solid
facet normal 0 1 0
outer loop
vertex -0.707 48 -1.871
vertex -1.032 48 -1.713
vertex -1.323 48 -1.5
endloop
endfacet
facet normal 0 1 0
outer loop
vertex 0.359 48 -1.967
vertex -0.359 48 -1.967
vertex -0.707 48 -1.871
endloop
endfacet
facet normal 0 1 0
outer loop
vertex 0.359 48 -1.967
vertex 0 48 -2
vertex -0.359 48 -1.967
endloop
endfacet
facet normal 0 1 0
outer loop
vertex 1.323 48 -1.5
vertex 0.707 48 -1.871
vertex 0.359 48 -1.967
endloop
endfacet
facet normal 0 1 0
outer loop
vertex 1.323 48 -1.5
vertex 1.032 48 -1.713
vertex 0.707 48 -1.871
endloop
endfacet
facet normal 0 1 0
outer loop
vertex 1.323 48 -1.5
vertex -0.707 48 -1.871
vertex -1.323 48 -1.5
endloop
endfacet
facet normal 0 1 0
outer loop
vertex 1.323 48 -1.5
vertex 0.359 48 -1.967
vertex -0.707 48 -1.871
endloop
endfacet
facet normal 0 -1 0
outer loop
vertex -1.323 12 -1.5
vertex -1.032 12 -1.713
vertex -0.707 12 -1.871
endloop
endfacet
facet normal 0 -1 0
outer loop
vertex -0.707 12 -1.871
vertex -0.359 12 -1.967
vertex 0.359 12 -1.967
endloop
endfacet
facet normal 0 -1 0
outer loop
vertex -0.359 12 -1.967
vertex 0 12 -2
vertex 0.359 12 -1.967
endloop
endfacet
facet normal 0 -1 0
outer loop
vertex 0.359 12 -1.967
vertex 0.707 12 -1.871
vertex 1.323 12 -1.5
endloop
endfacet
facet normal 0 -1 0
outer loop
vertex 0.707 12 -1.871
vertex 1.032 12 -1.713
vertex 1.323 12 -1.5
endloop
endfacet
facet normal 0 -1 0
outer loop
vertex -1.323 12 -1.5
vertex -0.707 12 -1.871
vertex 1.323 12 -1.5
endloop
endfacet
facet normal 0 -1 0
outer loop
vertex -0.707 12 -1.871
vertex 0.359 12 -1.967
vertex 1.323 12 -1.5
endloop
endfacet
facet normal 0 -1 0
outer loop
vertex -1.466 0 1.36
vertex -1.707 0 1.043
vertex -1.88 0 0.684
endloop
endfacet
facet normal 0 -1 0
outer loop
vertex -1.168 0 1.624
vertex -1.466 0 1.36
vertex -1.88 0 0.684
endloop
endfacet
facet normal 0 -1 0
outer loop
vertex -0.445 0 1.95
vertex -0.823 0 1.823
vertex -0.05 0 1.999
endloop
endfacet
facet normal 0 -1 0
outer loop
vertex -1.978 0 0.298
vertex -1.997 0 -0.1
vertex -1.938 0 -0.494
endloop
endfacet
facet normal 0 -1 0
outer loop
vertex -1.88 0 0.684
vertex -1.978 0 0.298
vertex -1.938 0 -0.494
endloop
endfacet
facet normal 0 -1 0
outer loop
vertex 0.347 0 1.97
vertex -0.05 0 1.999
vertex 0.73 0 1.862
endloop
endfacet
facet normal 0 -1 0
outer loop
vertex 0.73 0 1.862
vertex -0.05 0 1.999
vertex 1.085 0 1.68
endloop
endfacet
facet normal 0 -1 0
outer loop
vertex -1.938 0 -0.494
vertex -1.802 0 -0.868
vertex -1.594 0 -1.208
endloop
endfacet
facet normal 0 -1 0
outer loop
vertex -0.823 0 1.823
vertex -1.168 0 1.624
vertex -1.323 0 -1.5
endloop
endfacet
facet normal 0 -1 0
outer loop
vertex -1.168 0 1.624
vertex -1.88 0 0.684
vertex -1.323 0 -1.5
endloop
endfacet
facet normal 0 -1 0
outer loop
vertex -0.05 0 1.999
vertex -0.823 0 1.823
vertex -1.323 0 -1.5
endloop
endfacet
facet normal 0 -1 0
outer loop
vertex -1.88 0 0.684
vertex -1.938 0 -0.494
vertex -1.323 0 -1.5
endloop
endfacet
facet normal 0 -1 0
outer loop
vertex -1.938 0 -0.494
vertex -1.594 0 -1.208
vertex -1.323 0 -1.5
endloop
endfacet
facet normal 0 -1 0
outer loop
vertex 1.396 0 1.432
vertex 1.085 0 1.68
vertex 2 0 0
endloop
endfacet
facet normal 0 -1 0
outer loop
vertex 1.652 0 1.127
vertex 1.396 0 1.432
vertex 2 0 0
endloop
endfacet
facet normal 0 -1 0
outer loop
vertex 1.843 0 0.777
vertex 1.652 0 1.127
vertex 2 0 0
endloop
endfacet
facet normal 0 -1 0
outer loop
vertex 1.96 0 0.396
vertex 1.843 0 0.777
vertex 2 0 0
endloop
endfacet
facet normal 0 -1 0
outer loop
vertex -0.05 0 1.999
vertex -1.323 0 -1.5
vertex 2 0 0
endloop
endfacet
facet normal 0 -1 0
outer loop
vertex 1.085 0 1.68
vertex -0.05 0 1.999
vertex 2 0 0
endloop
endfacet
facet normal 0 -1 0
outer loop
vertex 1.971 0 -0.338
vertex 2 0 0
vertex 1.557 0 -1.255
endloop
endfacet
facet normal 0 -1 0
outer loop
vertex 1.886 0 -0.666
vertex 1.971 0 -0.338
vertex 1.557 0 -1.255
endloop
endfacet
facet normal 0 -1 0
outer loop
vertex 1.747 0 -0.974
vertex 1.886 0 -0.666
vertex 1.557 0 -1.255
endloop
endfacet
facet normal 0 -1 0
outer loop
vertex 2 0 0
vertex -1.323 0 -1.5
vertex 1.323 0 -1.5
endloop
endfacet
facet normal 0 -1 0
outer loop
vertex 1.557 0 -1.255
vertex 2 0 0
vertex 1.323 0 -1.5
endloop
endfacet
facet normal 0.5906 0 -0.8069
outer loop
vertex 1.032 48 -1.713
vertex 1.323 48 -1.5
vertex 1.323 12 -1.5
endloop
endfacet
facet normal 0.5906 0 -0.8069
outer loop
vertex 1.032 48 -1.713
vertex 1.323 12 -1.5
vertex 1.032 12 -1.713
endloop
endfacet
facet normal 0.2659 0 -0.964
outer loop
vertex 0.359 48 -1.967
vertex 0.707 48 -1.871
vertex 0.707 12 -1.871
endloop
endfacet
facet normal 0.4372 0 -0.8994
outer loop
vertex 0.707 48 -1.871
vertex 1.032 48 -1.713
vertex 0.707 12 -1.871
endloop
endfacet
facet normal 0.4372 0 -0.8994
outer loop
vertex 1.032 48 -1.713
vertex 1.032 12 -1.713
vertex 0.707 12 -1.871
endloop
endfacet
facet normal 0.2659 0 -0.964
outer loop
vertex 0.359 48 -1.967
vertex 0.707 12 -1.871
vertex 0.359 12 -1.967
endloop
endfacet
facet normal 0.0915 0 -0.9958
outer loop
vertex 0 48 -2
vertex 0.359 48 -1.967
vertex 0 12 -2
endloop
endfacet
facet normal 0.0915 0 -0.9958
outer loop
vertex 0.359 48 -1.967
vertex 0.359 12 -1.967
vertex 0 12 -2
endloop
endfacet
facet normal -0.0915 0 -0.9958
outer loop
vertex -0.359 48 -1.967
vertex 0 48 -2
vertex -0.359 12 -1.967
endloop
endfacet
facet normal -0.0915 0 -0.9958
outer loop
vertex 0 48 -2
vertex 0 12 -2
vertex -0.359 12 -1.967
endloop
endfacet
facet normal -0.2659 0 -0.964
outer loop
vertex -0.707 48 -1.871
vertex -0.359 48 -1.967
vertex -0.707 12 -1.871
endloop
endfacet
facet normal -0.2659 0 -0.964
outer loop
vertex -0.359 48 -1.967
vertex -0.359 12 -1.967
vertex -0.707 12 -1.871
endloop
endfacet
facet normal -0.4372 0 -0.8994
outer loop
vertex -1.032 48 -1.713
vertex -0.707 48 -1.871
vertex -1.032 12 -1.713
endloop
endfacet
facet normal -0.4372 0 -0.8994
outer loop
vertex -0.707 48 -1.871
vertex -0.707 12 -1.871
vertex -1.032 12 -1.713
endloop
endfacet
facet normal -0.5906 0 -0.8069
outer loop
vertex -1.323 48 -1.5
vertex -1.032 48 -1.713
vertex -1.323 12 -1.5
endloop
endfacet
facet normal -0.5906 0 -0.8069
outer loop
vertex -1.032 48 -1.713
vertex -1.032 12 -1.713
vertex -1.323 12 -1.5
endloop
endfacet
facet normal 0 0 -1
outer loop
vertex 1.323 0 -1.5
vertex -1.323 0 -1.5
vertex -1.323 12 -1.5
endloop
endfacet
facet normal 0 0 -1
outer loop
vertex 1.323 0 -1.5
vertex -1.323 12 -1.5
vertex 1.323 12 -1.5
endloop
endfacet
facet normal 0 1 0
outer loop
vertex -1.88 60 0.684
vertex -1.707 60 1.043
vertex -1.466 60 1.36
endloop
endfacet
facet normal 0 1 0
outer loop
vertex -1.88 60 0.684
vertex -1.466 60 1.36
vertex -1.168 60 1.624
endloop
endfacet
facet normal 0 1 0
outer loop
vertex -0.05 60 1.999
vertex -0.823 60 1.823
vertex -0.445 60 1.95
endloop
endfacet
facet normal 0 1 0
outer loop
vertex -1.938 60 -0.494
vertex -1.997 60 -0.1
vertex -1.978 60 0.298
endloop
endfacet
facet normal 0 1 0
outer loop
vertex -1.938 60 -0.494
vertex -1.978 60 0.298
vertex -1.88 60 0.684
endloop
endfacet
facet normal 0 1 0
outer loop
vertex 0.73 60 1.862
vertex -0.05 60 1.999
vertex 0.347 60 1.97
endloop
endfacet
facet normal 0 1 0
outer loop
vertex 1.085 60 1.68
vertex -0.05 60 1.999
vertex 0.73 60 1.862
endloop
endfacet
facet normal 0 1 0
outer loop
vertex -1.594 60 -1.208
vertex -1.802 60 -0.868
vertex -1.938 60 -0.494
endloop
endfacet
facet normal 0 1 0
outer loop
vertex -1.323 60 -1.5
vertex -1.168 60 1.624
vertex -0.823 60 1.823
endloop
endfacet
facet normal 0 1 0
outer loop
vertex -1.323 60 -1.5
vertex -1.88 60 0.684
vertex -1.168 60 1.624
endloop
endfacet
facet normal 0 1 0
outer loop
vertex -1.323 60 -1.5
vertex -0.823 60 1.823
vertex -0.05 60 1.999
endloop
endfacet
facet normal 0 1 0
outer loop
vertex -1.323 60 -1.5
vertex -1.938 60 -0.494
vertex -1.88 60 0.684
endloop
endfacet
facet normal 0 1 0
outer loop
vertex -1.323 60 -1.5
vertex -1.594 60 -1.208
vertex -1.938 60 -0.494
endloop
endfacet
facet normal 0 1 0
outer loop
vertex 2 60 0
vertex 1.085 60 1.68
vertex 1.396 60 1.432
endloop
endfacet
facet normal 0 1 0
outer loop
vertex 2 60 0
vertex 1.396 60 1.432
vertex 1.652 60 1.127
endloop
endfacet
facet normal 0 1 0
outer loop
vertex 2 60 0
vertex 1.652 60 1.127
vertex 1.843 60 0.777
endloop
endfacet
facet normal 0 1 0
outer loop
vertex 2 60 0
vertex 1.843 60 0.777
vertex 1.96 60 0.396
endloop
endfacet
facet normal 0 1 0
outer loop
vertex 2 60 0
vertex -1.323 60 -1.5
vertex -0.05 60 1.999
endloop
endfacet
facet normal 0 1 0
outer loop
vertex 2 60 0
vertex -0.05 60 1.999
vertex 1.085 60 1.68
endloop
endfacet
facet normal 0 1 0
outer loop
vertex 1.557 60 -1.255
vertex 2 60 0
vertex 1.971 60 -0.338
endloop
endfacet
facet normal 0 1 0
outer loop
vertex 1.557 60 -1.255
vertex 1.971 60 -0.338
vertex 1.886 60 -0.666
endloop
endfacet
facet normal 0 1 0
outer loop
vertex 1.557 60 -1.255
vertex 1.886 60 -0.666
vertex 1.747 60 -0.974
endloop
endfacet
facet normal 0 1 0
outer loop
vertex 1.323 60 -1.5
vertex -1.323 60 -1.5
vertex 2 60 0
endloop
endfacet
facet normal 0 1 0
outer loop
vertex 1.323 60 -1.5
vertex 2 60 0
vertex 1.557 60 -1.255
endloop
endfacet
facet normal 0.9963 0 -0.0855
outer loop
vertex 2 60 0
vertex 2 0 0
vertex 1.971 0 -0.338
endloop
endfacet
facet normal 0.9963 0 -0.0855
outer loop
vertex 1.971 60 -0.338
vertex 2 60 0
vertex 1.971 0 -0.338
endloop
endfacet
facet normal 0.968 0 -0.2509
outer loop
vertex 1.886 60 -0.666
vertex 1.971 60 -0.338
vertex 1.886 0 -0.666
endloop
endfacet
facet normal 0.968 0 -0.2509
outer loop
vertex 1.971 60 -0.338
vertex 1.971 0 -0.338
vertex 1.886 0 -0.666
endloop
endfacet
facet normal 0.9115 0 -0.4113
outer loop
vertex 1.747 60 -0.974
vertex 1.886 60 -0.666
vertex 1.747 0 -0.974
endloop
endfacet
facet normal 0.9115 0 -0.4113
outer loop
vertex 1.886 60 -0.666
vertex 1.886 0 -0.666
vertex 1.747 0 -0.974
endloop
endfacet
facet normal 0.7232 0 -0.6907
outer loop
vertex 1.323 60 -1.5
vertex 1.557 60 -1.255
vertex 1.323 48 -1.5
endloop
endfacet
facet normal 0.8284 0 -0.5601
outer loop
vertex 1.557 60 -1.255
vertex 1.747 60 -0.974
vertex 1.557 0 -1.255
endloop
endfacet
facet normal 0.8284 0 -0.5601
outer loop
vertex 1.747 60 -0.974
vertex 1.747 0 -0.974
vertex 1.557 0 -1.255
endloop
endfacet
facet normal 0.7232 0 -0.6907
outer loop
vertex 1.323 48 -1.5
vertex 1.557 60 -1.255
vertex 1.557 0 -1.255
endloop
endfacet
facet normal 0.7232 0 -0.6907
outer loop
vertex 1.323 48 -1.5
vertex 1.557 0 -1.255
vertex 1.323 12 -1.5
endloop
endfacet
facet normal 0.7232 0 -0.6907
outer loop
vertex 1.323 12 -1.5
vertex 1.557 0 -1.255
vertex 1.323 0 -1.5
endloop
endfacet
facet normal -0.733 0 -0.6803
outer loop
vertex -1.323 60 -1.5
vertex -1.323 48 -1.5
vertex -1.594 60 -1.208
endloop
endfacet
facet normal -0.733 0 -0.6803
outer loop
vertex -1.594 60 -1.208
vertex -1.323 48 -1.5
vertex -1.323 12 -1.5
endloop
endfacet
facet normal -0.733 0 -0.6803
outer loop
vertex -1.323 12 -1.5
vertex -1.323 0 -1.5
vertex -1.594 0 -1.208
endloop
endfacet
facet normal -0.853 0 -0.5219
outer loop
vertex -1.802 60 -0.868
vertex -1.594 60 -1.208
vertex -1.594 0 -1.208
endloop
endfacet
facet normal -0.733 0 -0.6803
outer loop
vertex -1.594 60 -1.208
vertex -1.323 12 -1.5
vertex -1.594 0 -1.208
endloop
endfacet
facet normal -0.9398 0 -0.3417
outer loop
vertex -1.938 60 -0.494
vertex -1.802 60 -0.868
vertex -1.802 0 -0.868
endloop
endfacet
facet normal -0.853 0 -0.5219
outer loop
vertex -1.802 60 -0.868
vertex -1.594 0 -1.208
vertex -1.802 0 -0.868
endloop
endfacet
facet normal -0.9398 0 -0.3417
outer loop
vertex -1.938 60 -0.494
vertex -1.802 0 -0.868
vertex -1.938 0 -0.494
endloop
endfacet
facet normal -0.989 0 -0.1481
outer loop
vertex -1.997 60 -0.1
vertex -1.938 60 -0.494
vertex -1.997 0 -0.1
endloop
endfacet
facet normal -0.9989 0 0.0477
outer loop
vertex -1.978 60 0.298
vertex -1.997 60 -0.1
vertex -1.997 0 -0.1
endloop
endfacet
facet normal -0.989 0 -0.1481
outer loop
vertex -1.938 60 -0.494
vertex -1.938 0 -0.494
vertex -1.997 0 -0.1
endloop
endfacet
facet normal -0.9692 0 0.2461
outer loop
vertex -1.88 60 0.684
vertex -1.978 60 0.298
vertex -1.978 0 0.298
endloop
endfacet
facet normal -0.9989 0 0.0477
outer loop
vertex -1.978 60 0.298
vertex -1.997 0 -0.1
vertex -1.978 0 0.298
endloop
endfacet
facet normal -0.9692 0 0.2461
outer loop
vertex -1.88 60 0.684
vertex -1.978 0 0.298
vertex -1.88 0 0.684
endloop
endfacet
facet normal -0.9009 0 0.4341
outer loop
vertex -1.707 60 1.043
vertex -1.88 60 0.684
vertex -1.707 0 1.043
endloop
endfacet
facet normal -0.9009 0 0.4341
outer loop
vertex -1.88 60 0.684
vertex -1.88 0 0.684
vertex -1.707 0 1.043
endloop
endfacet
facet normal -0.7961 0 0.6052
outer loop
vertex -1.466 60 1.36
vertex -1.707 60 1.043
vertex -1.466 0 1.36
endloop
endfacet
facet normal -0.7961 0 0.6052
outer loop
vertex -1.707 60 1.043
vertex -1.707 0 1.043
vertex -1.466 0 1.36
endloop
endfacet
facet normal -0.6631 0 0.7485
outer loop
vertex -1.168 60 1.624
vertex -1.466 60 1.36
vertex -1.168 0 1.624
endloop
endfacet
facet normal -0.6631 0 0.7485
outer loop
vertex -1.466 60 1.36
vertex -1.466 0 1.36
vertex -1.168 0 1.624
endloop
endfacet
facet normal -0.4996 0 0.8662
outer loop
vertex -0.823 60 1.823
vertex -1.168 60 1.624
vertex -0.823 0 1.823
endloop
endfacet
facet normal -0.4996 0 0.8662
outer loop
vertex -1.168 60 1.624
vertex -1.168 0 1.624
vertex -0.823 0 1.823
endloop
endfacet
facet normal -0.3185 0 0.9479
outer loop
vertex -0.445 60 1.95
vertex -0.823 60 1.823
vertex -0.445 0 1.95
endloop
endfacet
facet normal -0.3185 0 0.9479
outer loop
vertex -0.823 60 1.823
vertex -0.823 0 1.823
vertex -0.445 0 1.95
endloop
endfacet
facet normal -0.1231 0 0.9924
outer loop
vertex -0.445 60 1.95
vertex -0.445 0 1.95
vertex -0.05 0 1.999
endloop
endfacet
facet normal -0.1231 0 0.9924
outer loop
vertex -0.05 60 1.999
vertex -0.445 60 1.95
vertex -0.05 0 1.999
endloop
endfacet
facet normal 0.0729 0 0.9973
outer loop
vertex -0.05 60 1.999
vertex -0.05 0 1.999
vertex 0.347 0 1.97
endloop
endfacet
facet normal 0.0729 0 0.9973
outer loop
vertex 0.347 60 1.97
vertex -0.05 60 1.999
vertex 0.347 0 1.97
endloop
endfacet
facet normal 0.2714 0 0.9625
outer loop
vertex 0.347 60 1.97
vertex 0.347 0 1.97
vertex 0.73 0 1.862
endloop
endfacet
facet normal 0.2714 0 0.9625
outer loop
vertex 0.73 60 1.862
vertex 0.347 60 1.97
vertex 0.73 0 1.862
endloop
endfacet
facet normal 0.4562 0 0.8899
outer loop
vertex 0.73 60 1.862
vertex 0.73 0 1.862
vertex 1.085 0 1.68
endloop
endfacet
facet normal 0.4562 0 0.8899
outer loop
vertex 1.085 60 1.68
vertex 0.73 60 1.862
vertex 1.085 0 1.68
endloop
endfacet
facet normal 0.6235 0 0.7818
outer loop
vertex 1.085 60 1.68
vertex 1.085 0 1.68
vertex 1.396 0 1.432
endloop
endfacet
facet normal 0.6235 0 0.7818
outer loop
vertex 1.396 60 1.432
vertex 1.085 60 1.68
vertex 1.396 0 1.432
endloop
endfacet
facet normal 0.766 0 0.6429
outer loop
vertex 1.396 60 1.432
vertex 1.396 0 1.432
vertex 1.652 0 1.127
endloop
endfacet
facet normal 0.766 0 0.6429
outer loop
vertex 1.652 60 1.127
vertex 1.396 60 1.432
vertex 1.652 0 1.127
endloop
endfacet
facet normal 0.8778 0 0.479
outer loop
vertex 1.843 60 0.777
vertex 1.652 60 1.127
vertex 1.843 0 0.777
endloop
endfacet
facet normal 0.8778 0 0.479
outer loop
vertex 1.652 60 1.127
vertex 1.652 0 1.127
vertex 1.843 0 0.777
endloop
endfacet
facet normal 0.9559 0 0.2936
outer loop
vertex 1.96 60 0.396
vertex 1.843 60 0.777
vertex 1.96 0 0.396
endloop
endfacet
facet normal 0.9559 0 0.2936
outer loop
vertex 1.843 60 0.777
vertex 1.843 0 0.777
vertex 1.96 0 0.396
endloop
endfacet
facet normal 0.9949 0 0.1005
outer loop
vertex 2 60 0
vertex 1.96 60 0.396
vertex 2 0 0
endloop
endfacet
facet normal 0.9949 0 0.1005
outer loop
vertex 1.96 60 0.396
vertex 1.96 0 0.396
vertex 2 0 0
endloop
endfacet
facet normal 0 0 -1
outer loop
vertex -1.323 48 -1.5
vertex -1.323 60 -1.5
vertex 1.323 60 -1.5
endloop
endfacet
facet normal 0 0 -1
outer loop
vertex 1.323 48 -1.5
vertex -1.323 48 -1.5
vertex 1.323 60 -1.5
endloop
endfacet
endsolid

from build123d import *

# Parameters (mm, degrees)
SKETCH1_R          = 2
LENGTH_DEPTH       = 60
CUT_EXTRUDE1_DEPTH = 12


with BuildPart() as part:
    # Sketch1 → Length (new body)
    with BuildSketch(Plane(origin=(0, 0, 0), x_dir=(1, 0, 0), z_dir=(0, 1, 0))):
        Circle(SKETCH1_R)
    extrude(amount=LENGTH_DEPTH)

    # Sketch1<3> → Cut-Extrude1 (cut)
    with BuildSketch(Plane(origin=(0, 0, 0), x_dir=(1, 0, 0), z_dir=(0, 1, 0))):
        with BuildLine():
            ThreePointArc((1.322875656, 1.5), (0, 2), (-1.322875656, 1.5))
            Line((-1.322875656, 1.5), (1.322875656, 1.5))
        make_face()
    cut_extrude1 = extrude(amount=CUT_EXTRUDE1_DEPTH, mode=Mode.SUBTRACT)

    # Mirror1: Cut-Extrude1 across plane
    add(cut_extrude1.mirror(Plane(origin=(0, 30, 0), x_dir=(0, 0, 1), z_dir=(0, -1, 0))), mode=Mode.SUBTRACT)


solid = part.part
